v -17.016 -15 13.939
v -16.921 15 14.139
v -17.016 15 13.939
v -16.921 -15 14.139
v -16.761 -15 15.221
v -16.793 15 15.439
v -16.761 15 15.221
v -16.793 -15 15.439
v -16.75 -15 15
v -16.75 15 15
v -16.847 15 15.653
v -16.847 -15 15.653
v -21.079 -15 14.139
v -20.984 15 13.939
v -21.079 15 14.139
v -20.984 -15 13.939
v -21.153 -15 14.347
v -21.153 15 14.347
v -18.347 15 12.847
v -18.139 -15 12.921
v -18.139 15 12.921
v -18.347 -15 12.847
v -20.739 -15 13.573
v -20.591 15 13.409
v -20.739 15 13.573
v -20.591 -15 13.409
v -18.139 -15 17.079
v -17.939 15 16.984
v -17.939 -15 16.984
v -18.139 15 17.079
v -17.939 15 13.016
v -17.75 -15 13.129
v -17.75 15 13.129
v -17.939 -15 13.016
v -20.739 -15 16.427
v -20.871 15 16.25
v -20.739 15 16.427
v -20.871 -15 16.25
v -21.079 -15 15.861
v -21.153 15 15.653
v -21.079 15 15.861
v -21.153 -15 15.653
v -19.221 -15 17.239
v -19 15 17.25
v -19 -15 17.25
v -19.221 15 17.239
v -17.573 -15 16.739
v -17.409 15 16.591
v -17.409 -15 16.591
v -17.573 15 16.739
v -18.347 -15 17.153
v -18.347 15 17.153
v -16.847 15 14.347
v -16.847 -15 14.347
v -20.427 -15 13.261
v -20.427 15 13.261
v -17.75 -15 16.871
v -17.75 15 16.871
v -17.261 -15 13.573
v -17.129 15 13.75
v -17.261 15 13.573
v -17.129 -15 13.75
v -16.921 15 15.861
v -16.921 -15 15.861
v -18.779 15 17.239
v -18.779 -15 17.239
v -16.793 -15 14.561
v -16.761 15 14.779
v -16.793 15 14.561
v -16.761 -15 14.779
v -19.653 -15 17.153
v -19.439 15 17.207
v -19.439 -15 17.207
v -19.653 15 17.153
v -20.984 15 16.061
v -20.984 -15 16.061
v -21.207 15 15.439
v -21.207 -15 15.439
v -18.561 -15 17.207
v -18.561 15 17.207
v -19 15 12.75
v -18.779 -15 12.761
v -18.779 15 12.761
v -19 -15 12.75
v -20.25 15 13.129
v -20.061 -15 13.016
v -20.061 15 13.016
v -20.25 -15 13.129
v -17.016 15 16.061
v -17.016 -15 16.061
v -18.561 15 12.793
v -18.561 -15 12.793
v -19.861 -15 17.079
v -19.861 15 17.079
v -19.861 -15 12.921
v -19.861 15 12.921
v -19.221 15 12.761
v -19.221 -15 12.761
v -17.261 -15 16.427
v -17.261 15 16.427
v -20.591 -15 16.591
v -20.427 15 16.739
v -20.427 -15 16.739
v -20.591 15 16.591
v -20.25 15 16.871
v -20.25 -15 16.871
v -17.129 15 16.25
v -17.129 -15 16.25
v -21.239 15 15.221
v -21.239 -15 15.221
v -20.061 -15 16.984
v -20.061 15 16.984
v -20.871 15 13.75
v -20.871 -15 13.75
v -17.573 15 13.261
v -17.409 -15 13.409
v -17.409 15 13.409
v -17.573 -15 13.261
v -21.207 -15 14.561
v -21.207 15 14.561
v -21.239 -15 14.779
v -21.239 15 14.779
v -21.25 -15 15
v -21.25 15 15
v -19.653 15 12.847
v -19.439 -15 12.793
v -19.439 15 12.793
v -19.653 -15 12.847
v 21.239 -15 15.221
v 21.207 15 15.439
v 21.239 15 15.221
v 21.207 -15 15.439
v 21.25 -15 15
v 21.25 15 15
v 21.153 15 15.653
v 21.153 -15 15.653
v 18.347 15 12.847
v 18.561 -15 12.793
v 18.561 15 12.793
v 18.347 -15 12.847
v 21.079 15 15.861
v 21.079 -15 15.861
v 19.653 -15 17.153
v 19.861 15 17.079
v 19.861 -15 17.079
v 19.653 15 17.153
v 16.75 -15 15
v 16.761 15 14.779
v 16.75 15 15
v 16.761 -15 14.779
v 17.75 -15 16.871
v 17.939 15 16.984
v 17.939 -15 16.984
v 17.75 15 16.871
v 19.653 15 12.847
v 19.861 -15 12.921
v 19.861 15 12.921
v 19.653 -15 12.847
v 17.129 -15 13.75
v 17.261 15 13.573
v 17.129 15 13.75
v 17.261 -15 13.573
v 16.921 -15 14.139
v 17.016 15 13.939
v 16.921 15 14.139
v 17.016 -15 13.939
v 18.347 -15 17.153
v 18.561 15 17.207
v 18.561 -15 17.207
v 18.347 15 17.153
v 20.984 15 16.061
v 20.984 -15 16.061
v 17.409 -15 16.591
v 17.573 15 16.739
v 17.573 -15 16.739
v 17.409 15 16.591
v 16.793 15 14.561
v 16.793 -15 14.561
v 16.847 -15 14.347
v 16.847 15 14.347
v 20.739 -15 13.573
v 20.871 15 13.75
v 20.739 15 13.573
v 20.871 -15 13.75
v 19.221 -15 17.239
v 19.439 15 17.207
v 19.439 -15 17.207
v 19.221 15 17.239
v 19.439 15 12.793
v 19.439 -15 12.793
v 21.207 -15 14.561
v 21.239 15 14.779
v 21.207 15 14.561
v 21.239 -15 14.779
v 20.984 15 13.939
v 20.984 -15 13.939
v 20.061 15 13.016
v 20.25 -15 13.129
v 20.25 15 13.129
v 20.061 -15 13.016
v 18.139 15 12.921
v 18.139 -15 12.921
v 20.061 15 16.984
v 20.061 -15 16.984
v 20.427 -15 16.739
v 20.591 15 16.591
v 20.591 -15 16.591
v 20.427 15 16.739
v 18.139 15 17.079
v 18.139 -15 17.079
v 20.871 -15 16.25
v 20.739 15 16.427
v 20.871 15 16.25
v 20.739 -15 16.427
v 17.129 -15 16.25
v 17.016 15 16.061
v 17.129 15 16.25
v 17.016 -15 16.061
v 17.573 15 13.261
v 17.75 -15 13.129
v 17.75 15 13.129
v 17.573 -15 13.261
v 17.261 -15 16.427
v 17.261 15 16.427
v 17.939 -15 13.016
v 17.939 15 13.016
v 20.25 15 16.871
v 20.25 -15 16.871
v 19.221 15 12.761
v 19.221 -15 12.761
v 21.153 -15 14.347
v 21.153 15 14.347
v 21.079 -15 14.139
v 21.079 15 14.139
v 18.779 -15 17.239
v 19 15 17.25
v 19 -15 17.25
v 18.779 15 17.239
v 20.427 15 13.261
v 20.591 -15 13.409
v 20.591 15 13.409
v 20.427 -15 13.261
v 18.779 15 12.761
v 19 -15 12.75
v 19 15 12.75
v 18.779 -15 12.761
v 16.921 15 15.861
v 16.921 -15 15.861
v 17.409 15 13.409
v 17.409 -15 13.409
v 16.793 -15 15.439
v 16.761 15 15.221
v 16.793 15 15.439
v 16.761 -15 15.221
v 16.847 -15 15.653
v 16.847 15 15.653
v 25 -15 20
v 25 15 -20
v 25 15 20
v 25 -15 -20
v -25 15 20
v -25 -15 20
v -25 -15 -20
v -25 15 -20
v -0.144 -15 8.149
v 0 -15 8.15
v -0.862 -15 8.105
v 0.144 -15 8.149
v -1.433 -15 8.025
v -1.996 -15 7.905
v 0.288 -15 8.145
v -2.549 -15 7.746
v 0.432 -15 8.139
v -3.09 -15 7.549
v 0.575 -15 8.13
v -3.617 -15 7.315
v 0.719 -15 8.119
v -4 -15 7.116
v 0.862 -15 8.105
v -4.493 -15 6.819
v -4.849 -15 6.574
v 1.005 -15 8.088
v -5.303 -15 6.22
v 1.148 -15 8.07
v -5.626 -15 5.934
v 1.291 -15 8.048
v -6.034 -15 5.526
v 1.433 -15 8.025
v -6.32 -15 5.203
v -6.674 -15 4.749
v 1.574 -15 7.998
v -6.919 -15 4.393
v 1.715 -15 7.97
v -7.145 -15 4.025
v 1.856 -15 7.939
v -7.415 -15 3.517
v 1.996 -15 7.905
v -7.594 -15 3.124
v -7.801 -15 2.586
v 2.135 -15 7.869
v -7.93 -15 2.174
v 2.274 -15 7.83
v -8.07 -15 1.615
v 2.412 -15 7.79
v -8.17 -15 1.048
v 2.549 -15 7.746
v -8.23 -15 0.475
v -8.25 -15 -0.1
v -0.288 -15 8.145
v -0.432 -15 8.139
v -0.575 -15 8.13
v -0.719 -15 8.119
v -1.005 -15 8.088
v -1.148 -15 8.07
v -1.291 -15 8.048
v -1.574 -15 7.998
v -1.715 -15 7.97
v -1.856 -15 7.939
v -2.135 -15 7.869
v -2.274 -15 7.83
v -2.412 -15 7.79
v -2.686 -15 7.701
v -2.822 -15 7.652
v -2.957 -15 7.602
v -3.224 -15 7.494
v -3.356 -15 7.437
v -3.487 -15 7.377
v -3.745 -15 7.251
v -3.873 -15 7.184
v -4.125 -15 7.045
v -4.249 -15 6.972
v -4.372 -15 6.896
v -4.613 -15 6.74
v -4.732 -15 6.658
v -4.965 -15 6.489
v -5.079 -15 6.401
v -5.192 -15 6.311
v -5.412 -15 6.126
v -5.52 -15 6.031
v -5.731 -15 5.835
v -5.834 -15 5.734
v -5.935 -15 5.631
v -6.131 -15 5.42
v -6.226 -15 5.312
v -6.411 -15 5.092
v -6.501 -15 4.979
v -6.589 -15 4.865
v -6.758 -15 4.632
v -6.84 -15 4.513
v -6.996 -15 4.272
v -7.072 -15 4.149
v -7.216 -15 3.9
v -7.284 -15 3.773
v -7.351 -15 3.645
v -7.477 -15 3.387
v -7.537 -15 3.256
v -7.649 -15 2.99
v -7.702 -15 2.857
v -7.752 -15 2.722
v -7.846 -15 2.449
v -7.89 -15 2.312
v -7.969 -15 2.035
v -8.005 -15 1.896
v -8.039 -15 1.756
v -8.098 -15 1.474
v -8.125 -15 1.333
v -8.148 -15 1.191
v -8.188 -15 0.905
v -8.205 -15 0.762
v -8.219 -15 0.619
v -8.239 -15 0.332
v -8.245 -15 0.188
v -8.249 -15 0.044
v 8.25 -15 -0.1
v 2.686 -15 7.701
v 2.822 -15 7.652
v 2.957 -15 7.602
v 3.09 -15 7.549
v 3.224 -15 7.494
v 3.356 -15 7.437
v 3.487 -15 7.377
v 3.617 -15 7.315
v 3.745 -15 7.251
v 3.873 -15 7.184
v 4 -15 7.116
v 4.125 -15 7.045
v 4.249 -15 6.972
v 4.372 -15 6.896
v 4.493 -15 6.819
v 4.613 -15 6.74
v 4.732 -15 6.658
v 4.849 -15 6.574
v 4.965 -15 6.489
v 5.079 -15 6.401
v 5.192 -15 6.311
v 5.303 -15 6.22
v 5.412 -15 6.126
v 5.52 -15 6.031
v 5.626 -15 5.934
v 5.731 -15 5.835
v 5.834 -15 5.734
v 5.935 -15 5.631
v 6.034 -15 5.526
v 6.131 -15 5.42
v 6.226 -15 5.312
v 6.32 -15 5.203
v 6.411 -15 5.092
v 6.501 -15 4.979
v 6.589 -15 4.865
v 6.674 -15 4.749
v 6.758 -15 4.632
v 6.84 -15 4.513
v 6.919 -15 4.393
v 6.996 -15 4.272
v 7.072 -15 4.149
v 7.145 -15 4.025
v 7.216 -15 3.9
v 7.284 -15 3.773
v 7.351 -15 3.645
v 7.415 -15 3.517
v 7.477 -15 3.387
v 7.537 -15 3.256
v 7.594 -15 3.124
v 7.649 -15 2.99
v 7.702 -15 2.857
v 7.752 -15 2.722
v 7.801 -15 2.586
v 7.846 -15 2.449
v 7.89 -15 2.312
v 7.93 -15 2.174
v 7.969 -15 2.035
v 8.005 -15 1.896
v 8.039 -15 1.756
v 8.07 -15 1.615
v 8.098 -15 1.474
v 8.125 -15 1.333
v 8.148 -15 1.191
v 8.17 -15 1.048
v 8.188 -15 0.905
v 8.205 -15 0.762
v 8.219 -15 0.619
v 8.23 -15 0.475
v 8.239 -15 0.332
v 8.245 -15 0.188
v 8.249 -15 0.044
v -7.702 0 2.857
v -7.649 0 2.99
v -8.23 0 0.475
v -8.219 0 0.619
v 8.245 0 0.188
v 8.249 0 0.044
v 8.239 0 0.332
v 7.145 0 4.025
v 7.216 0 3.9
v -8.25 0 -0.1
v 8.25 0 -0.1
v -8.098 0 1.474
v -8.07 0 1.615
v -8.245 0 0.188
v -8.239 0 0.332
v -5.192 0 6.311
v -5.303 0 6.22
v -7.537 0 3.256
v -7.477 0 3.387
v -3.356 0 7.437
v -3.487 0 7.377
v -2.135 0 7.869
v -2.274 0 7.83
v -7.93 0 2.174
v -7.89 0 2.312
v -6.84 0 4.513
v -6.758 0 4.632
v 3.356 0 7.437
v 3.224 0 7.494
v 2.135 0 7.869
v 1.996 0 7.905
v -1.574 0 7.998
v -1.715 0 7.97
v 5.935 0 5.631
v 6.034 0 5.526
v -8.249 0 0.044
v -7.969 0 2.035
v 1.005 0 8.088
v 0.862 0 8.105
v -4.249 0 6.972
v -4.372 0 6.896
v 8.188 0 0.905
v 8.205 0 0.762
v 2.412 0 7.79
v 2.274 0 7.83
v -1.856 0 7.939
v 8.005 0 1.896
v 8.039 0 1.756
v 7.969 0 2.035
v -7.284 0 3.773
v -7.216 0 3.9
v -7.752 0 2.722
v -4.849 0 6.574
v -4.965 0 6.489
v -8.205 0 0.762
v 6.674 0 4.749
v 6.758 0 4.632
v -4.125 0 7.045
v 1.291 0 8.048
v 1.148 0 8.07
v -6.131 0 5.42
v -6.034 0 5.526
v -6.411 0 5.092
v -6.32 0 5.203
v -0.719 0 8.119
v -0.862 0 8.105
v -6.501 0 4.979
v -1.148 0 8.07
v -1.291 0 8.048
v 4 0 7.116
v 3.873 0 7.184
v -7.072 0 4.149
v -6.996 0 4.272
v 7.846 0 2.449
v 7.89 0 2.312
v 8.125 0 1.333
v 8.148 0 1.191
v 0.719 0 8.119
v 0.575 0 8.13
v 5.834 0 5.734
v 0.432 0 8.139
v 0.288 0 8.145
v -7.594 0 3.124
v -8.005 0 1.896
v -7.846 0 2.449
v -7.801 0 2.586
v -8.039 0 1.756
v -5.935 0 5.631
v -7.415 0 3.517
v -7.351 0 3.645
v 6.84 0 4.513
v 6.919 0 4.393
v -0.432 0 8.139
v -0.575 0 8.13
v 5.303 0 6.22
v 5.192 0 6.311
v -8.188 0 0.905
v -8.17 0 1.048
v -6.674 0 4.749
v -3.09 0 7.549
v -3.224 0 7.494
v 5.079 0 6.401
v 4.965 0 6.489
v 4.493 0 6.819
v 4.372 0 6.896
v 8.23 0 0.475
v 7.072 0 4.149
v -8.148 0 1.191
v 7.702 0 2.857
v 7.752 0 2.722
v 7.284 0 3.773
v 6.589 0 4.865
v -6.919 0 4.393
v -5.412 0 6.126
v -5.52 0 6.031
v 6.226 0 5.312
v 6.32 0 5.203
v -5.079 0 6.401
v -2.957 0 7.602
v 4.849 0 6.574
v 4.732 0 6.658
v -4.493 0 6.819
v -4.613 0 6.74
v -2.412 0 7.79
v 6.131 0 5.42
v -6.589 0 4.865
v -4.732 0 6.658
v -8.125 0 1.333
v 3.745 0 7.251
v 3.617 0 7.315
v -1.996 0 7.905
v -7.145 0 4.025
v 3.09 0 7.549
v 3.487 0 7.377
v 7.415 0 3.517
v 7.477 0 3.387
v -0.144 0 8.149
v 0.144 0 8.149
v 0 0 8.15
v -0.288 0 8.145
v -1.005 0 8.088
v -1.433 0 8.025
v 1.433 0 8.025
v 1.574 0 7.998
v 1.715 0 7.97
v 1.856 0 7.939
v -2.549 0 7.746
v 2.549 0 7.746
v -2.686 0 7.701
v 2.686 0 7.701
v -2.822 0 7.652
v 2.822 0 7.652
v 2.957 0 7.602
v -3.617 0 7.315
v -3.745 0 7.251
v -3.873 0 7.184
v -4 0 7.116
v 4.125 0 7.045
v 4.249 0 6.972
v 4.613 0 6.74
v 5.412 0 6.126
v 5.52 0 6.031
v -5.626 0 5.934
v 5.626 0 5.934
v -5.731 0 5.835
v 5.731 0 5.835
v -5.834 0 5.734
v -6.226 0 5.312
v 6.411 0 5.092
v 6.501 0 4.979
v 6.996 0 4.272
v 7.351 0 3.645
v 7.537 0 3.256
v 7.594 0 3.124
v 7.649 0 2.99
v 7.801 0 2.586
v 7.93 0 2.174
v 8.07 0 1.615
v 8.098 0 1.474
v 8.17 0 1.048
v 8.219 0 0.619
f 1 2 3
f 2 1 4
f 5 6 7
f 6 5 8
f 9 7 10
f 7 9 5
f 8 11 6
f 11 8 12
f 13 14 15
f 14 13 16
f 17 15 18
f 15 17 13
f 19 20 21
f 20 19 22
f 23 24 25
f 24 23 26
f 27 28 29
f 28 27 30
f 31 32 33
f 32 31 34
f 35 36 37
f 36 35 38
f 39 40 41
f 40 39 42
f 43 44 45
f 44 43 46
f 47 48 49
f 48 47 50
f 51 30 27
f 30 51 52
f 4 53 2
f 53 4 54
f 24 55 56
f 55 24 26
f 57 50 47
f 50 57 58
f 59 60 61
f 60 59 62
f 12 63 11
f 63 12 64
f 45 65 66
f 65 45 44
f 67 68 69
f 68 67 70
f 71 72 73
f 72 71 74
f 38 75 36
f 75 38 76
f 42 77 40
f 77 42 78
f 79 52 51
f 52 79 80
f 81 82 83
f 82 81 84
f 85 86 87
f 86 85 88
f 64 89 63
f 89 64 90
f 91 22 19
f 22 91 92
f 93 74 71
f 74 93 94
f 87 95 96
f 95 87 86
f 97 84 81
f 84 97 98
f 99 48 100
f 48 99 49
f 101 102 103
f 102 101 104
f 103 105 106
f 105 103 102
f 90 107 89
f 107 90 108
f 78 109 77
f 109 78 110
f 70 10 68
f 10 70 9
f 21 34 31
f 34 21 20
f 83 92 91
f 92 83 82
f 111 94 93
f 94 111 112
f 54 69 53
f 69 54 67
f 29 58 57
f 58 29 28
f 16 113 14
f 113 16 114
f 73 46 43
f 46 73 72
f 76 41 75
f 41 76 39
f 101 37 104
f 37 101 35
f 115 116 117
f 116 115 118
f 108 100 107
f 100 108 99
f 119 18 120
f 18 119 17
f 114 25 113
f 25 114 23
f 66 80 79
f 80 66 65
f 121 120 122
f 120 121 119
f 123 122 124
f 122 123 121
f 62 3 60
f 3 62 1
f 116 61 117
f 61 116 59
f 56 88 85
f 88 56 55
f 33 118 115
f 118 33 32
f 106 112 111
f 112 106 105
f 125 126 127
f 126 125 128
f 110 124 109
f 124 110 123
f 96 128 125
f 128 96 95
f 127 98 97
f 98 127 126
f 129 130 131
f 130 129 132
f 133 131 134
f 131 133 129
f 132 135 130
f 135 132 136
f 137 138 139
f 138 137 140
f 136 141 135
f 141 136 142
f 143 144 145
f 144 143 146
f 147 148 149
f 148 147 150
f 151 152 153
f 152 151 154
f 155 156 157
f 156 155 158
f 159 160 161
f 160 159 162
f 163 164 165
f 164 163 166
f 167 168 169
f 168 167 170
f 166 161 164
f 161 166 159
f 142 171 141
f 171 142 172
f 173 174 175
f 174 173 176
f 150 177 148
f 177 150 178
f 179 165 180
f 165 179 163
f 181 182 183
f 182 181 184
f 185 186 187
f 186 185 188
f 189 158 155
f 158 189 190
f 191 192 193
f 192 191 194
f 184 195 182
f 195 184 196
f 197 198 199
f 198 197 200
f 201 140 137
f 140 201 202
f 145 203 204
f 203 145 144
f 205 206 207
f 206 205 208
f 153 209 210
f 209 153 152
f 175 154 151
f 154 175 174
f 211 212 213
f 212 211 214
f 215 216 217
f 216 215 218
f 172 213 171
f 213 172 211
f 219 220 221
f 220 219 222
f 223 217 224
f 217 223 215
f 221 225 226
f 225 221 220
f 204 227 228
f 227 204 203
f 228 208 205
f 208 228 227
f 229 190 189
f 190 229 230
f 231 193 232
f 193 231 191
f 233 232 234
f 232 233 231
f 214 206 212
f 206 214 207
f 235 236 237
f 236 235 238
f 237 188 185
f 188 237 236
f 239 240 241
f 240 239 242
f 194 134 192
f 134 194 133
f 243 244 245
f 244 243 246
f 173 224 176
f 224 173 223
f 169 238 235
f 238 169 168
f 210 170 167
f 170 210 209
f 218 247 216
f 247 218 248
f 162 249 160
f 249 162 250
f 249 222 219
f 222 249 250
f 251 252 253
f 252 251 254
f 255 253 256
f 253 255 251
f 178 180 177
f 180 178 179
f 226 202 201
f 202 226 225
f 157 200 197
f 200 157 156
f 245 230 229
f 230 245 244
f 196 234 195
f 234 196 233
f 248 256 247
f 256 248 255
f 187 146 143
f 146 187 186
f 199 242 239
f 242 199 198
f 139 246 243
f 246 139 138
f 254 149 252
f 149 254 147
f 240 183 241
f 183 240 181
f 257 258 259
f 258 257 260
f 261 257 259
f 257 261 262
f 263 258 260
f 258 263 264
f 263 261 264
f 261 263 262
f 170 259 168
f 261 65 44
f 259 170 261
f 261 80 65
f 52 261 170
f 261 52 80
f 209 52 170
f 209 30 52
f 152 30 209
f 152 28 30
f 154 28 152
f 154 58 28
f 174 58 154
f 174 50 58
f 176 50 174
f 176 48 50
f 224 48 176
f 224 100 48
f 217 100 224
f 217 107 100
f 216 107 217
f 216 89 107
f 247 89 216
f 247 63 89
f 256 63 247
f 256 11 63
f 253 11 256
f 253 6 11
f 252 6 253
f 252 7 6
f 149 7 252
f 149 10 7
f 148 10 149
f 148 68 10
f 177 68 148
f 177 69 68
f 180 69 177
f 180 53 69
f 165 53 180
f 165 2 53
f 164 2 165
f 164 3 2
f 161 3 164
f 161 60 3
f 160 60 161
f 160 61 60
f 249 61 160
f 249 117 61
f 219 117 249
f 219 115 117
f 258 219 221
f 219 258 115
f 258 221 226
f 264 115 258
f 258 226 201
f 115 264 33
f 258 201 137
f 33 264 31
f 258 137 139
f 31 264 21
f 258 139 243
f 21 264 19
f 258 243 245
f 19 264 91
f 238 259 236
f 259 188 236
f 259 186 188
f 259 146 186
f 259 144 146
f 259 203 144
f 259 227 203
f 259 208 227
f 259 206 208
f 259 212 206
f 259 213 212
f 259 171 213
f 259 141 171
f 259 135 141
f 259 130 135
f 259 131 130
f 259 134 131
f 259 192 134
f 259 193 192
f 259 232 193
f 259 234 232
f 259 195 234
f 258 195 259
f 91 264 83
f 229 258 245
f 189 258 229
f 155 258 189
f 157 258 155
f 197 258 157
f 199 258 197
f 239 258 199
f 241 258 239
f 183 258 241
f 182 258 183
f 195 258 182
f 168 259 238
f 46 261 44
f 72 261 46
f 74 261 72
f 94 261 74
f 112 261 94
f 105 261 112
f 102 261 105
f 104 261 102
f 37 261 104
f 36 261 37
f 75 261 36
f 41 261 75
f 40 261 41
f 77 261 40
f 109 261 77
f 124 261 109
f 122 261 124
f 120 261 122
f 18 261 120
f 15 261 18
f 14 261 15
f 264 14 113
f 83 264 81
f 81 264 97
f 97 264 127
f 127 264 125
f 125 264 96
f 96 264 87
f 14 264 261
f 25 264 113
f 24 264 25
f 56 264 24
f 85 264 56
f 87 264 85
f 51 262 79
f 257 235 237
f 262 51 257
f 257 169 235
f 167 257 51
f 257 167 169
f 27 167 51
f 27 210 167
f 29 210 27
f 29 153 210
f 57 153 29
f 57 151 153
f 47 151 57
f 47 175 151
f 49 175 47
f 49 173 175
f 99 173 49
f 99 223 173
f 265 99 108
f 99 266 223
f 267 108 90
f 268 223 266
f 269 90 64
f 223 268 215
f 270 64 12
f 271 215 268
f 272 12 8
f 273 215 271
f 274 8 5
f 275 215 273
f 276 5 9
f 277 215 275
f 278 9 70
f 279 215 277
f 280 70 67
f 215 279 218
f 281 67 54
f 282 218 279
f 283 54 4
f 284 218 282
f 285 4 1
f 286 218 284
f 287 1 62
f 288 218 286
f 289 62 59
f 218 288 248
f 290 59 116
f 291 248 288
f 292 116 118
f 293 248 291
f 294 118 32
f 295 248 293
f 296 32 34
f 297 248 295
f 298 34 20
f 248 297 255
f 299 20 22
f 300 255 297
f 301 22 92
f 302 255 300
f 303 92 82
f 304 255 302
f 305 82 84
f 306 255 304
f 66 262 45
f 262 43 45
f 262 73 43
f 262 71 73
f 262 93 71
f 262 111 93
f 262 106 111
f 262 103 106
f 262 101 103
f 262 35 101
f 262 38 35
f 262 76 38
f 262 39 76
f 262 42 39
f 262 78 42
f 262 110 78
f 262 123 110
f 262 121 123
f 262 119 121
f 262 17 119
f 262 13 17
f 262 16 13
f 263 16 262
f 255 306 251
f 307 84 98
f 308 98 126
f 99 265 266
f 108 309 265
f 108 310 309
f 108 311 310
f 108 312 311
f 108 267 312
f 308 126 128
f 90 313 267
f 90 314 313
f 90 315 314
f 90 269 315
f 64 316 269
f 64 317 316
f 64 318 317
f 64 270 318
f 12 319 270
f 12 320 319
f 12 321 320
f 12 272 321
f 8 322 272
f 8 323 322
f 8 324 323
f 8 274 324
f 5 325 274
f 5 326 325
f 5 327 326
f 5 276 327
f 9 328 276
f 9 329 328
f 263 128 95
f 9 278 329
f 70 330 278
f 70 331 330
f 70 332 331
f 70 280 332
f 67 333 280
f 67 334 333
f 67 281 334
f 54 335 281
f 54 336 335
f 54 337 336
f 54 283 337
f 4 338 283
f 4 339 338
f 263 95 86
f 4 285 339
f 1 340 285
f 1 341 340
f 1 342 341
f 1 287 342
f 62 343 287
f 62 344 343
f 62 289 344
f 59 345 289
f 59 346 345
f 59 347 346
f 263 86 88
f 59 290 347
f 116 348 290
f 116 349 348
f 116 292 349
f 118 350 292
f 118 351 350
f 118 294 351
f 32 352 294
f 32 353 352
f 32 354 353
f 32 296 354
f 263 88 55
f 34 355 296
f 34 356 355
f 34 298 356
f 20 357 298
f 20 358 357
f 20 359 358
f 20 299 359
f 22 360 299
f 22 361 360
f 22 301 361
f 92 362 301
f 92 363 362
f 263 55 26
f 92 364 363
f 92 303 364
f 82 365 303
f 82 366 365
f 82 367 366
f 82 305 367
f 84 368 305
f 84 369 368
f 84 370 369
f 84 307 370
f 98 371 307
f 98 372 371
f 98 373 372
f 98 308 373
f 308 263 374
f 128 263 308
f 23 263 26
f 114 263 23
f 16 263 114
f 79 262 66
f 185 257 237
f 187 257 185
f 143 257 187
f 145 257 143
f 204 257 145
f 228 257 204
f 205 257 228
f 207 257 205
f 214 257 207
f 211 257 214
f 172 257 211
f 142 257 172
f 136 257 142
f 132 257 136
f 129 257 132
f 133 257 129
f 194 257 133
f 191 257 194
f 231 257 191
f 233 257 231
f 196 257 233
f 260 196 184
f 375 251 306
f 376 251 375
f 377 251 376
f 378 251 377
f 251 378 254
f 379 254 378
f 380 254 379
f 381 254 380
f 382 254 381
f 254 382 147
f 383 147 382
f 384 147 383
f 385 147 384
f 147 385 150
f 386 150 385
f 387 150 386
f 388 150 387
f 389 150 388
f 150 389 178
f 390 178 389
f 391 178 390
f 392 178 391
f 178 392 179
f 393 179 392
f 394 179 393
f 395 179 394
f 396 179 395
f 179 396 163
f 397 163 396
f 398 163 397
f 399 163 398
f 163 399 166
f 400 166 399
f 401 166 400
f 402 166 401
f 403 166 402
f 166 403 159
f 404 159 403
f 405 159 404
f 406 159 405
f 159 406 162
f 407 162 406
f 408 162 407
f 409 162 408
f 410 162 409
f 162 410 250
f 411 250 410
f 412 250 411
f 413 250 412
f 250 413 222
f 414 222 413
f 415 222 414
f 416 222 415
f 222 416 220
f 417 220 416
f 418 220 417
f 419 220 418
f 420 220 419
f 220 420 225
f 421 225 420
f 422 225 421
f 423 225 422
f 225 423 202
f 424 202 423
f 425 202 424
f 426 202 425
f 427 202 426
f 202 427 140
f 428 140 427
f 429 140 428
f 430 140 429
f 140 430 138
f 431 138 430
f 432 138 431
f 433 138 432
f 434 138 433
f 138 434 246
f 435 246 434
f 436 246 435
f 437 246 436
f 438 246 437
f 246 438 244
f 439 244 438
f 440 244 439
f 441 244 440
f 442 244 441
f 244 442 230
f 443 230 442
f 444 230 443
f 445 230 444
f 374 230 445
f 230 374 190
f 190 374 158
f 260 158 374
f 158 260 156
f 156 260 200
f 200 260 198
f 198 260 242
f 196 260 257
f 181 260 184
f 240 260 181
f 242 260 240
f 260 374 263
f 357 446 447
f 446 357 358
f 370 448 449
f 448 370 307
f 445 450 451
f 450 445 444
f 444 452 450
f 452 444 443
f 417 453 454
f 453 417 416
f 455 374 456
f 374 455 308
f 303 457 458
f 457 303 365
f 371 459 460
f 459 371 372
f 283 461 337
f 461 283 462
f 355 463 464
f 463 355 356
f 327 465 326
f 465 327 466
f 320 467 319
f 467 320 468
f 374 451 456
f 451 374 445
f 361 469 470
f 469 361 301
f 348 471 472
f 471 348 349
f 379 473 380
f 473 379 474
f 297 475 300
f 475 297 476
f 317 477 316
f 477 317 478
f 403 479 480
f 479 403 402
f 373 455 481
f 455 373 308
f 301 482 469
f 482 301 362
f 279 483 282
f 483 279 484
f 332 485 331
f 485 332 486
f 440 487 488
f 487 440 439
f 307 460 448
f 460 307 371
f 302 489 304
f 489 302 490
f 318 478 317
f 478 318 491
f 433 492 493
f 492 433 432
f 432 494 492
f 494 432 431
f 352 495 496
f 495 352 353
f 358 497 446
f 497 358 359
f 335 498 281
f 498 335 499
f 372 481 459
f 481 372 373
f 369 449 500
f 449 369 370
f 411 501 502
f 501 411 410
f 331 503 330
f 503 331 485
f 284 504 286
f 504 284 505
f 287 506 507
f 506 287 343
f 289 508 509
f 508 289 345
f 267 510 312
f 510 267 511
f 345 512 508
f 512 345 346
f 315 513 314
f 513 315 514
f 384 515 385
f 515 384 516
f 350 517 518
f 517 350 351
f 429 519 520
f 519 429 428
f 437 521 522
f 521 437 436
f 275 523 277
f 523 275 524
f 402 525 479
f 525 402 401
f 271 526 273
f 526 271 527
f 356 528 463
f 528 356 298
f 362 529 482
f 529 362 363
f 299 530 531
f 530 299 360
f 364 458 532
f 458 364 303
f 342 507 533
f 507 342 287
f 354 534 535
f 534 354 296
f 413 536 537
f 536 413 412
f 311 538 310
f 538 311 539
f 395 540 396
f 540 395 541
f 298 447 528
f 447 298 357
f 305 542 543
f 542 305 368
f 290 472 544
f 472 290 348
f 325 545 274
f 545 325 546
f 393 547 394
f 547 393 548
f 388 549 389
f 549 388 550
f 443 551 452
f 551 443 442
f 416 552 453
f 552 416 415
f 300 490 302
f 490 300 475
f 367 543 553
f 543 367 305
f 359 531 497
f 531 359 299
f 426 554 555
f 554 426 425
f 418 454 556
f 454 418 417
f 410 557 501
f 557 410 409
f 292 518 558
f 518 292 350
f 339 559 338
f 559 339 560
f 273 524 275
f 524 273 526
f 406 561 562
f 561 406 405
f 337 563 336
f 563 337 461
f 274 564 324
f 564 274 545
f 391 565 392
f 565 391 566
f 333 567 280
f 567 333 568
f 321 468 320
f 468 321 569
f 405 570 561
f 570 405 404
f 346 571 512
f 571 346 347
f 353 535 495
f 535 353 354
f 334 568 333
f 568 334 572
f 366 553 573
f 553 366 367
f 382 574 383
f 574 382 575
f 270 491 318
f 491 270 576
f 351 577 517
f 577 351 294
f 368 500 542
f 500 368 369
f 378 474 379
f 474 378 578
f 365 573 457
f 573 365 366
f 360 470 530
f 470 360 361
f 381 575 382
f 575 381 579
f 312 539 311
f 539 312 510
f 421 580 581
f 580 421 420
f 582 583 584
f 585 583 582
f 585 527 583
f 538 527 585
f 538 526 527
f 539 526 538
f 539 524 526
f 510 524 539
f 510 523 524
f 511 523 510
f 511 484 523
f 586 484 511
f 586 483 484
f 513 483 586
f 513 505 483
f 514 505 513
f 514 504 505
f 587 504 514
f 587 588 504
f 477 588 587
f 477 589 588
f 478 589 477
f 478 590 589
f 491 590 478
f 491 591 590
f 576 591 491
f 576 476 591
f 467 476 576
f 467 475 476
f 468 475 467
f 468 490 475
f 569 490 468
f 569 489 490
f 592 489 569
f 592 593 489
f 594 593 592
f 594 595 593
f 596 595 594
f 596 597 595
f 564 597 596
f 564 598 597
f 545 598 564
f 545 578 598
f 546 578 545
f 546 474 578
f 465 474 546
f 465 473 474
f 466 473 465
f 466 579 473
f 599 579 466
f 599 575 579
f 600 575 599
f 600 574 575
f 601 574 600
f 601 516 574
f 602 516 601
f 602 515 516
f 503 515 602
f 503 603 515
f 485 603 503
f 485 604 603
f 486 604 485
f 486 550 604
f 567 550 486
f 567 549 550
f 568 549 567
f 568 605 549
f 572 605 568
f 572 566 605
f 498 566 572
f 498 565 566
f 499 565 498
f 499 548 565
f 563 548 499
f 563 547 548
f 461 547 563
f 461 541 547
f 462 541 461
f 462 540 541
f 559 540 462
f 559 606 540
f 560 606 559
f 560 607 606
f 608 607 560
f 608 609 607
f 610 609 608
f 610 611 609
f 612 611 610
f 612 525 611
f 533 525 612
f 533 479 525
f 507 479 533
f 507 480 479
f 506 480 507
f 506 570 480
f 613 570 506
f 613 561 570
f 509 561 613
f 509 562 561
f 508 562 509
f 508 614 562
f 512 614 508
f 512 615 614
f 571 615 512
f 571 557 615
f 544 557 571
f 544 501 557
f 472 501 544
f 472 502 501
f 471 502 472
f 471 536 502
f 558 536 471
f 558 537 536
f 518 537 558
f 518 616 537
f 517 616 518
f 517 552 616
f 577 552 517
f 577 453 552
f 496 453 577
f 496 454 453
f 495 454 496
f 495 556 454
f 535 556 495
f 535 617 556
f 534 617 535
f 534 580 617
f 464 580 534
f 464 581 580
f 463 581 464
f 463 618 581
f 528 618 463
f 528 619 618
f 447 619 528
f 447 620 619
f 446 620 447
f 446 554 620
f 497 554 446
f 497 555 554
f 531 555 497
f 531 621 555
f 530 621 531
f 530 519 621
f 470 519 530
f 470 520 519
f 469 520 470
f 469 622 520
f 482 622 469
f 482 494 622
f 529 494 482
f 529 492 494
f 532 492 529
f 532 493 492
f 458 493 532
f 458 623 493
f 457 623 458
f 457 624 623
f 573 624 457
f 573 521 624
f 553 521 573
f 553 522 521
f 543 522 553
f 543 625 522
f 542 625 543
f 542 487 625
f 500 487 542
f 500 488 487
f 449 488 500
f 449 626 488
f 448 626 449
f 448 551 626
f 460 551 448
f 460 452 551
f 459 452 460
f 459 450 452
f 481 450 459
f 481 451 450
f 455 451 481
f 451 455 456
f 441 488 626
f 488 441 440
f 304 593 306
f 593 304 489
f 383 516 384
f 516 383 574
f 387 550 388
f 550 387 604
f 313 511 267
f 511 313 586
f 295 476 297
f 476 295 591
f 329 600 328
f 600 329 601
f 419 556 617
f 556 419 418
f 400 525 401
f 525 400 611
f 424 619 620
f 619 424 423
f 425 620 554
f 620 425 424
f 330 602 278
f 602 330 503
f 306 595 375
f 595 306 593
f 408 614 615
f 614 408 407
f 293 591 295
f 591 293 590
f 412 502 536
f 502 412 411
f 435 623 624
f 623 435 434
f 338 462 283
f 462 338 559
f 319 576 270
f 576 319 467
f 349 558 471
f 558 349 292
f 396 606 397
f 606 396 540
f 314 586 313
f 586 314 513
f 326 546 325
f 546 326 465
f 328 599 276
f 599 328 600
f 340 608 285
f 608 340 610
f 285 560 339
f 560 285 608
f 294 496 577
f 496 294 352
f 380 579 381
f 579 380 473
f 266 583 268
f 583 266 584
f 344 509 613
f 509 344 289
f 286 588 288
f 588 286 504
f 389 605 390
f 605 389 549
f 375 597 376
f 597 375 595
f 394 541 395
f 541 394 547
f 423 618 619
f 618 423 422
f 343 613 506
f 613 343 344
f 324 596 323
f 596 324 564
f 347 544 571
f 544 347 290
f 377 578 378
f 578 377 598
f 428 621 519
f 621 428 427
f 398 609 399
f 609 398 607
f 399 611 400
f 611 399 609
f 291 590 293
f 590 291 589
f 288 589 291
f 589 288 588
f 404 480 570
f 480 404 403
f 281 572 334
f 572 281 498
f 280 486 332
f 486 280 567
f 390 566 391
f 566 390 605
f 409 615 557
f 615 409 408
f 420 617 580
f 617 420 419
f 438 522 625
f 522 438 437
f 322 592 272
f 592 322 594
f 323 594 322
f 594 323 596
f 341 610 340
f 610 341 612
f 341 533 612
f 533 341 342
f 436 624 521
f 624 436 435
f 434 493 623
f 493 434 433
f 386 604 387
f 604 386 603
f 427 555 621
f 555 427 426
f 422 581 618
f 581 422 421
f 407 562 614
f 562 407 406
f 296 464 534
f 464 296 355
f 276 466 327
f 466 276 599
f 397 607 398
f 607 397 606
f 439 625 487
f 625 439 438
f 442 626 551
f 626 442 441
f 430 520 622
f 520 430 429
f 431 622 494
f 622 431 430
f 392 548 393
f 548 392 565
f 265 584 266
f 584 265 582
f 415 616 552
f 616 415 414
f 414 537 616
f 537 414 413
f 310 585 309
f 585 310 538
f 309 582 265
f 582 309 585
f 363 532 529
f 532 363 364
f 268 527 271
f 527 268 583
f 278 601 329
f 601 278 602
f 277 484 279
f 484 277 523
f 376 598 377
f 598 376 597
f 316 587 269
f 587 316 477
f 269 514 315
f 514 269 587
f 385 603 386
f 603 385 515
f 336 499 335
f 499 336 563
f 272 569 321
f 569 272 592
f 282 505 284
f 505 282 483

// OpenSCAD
$fn = 64;

// Dimensions
block_width = 50;      // X
block_depth = 30;      // Y
block_height = 40;     // Z
barrel_radius = 8.25;  // half of 16.5 mm width
barrel_channel_length = 15;  // from y=0 to y=-15
flange_slot_width = 34;
flange_slot_height = 2.6;
flange_slot_z_start = 30;
screw_hole_diameter = 4.5;
screw_hole_x = [-19, 19];
screw_hole_z = 15;

difference() {
    // Main block: 50 x 30 x 40, centered on origin in XY, standing on bed (z=0 to 40)
    cube([block_width, block_depth, block_height], center=true);
    
    // Barrel channel: half-cylinder from y=-15 (front) to y=0 (back)
    // Flat side at z=0, curved side up to z=8.25
    translate([0, 0, -0.1]) {
        rotate([90, 0, 0]) {
            linear_extrude(height = barrel_channel_length + 0.1, center = false) {
                polygon([
                    for (angle = [0 : 1 : 180]) 
                        [barrel_radius * cos(angle), barrel_radius * sin(angle)]
                ]);
            }
        }
    }
    
    // Flange slot: 34 mm wide (centered in X), 2.6 mm tall (z=30 to 32.6)
    // Cut from front face (y=-15) back to y=11
    translate([0, -2, 31.3]) {
        cube([flange_slot_width, 26.1, flange_slot_height], center=true);
    }
    
    // Screw holes: 4.5 mm diameter, at x=-19 and x=19, z=15
    // Go straight through from front to back (along Y)
    for (x = screw_hole_x) {
        translate([x, 0, screw_hole_z]) {
            rotate([90, 0, 0]) {
                cylinder(h=30.1, r=screw_hole_diameter/2, center=true);
            }
        }
    }
}
